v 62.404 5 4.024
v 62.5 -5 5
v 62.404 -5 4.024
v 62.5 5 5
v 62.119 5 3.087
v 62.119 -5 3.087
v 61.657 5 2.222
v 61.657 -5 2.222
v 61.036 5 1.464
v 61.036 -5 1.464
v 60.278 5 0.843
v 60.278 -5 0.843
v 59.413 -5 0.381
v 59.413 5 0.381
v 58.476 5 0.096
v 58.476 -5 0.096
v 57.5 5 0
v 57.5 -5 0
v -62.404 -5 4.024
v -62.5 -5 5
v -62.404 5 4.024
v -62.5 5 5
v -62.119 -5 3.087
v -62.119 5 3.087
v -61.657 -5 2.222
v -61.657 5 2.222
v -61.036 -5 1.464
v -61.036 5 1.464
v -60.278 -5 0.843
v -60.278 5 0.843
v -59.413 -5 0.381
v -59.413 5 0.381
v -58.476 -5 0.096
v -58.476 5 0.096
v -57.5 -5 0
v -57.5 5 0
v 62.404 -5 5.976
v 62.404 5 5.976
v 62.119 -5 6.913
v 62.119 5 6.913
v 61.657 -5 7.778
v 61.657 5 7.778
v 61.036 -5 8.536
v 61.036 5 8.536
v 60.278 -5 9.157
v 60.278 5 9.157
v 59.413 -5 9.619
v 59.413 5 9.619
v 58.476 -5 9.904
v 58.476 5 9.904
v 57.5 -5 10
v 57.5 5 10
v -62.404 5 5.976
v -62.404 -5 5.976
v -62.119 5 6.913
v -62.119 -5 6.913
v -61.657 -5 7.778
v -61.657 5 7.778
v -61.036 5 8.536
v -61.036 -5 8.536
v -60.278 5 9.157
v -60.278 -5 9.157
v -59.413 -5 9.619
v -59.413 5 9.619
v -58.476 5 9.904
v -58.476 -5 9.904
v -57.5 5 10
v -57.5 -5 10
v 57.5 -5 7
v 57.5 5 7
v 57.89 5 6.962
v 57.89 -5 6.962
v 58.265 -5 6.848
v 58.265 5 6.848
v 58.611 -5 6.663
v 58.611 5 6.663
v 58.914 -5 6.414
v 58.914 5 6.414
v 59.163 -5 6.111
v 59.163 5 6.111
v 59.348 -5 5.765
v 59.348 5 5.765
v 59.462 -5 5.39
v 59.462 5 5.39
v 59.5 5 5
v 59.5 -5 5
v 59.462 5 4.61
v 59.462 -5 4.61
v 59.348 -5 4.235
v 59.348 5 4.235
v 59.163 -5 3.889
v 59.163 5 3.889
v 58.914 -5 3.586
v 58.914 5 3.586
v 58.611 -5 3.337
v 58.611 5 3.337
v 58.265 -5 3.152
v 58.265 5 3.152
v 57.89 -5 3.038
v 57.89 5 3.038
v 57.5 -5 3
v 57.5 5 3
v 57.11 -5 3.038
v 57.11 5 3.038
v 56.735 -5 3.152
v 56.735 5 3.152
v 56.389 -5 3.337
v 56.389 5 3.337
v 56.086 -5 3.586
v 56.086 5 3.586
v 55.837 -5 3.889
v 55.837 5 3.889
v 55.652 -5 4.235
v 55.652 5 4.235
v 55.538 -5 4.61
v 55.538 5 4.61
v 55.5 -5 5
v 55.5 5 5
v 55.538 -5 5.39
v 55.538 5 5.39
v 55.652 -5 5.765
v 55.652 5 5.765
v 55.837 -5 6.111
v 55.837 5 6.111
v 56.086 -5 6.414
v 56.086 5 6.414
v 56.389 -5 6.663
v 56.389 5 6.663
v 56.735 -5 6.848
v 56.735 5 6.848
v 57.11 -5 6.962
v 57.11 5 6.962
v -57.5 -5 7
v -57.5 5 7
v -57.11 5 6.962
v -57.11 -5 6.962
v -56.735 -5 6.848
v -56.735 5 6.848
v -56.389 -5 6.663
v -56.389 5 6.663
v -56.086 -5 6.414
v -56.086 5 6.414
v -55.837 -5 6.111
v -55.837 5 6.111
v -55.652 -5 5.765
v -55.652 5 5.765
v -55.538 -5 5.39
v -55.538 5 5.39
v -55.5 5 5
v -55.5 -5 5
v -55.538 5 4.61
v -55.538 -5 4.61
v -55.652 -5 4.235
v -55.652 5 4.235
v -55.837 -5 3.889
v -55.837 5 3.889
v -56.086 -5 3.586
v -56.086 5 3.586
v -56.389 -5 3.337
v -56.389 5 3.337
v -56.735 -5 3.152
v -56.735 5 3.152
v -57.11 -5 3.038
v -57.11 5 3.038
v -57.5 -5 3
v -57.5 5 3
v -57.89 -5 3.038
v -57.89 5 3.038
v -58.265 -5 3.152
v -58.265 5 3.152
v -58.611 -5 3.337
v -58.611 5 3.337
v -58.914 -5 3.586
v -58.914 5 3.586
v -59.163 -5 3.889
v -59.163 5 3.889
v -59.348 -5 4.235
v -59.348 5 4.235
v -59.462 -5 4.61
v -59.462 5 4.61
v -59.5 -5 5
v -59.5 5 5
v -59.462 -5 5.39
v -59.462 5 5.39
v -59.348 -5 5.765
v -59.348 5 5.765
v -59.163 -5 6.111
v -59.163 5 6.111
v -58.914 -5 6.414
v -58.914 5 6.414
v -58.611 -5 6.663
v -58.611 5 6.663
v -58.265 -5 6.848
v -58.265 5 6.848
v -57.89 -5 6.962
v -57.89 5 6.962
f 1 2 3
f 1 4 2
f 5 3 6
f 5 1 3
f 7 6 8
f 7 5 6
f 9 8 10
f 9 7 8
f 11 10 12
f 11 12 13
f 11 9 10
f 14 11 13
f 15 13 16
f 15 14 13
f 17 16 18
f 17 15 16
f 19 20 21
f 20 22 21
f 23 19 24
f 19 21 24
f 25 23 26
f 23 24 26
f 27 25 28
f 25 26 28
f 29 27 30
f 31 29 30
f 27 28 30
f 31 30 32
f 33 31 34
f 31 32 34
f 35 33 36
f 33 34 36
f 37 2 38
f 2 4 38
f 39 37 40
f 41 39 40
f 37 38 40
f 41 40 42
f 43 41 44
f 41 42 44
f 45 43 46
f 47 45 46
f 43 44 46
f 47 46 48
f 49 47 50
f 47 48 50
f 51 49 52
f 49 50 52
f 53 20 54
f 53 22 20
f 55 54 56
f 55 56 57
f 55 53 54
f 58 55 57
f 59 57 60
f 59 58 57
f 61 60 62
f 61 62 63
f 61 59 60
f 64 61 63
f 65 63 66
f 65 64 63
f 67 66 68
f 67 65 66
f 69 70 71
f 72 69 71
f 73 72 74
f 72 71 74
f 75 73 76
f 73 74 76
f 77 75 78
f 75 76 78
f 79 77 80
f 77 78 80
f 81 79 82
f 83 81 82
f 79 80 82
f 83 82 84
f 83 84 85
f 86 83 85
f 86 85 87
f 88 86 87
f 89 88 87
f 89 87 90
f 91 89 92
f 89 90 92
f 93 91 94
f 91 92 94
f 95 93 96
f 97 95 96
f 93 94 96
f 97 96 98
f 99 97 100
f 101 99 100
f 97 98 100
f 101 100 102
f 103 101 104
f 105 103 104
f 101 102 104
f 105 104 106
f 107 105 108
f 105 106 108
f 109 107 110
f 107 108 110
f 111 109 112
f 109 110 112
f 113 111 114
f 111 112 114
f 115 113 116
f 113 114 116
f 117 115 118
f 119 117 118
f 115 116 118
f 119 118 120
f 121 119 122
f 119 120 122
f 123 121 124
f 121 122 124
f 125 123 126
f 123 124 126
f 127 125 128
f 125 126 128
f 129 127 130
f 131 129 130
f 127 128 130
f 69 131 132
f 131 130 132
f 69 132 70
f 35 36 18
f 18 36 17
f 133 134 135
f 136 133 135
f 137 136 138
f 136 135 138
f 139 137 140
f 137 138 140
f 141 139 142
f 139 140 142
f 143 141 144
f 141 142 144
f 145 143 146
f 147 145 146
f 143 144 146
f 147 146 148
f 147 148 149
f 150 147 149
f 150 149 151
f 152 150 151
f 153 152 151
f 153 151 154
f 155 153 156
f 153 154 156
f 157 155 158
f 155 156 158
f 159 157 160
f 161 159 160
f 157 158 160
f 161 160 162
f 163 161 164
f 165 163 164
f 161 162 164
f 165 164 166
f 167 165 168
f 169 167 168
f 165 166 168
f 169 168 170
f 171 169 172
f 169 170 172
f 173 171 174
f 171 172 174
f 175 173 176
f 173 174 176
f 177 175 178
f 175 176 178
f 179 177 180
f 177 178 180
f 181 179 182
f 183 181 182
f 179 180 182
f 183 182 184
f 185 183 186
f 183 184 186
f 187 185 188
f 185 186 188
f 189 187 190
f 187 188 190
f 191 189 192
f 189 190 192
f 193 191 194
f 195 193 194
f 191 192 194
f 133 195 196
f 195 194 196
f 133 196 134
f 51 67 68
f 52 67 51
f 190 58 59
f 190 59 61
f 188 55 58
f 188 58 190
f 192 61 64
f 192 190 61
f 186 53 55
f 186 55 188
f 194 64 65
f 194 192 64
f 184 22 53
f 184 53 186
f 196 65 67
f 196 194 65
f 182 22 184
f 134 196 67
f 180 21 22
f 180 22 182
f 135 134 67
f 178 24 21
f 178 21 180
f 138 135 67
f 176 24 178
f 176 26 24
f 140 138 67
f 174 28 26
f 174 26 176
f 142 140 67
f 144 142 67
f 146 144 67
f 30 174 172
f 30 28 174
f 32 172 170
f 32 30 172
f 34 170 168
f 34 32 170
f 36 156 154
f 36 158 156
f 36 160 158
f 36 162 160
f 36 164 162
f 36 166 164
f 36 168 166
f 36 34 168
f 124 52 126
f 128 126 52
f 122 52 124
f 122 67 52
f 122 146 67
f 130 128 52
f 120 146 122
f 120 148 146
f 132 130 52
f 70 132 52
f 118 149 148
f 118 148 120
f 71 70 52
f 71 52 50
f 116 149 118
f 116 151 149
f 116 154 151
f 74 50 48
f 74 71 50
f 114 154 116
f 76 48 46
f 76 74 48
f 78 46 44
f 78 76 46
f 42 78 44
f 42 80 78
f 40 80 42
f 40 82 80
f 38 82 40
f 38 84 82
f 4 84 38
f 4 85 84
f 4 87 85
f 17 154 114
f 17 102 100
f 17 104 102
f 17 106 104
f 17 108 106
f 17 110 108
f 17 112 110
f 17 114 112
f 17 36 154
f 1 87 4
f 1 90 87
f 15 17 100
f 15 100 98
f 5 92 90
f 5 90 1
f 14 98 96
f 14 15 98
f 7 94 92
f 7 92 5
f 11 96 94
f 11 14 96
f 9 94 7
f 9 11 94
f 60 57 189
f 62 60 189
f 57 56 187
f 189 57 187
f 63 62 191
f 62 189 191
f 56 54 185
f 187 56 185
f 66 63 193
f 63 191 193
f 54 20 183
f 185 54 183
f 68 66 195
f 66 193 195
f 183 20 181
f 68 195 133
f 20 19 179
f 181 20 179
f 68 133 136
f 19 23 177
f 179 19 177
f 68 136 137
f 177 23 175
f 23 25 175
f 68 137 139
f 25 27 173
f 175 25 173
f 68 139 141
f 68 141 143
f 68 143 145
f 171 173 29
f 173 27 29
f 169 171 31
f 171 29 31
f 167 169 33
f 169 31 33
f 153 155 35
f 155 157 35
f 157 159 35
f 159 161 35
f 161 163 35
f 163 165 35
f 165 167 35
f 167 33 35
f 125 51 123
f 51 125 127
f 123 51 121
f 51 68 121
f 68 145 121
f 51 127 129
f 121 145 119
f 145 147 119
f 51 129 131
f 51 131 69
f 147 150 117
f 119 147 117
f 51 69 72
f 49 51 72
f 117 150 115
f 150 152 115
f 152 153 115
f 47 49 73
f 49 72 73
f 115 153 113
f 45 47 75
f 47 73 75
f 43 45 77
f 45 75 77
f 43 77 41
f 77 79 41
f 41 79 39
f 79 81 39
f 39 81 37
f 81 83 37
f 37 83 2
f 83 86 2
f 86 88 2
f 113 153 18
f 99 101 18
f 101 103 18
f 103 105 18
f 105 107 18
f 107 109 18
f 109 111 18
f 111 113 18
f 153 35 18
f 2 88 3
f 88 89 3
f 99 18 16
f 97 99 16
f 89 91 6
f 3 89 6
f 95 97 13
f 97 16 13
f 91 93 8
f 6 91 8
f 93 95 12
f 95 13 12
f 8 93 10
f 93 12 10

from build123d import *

# Parameters (mm, degrees)
SKETCH_1_W          = 125
SKETCH_1_H          = 10
EXTRUDE_1_DEPTH     = 10
FILLET_1_R          = 5
SKETCH_2_R          = 2
CUT_EXTRUDE_1_DEPTH = 10


with BuildPart() as part:
    # 스케치1 → 보스-돌출1 (new body)
    with BuildSketch(Plane.XY):
        Rectangle(SKETCH_1_W, SKETCH_1_H)
    extrude(amount=EXTRUDE_1_DEPTH)

    # 필렛1
    fillet_1_edges = [part.edges().sort_by_distance(p)[0] for p in [
        (62.5, 0, 10),
        (62.5, 0, 0),
        (-62.5, 0, 0),
        (-62.5, 0, 10),
    ]]
    fillet(fillet_1_edges, radius=FILLET_1_R - 0.0001)  # a hair under: the kernel refuses the full size

    # 스케치2 → 컷-돌출1 (cut)
    with BuildSketch(Plane(origin=(0, 5, 0), x_dir=(1, 0, 0), z_dir=(0, 1, 0))):
        with Locations(Location((-57.5, -5, 0), (0, 0, 270))):
            Circle(SKETCH_2_R)
        with Locations(Location((57.5, -5, 0), (0, 0, 270))):
            Circle(SKETCH_2_R)
    extrude(amount=-CUT_EXTRUDE_1_DEPTH, mode=Mode.SUBTRACT)


solid = part.part
